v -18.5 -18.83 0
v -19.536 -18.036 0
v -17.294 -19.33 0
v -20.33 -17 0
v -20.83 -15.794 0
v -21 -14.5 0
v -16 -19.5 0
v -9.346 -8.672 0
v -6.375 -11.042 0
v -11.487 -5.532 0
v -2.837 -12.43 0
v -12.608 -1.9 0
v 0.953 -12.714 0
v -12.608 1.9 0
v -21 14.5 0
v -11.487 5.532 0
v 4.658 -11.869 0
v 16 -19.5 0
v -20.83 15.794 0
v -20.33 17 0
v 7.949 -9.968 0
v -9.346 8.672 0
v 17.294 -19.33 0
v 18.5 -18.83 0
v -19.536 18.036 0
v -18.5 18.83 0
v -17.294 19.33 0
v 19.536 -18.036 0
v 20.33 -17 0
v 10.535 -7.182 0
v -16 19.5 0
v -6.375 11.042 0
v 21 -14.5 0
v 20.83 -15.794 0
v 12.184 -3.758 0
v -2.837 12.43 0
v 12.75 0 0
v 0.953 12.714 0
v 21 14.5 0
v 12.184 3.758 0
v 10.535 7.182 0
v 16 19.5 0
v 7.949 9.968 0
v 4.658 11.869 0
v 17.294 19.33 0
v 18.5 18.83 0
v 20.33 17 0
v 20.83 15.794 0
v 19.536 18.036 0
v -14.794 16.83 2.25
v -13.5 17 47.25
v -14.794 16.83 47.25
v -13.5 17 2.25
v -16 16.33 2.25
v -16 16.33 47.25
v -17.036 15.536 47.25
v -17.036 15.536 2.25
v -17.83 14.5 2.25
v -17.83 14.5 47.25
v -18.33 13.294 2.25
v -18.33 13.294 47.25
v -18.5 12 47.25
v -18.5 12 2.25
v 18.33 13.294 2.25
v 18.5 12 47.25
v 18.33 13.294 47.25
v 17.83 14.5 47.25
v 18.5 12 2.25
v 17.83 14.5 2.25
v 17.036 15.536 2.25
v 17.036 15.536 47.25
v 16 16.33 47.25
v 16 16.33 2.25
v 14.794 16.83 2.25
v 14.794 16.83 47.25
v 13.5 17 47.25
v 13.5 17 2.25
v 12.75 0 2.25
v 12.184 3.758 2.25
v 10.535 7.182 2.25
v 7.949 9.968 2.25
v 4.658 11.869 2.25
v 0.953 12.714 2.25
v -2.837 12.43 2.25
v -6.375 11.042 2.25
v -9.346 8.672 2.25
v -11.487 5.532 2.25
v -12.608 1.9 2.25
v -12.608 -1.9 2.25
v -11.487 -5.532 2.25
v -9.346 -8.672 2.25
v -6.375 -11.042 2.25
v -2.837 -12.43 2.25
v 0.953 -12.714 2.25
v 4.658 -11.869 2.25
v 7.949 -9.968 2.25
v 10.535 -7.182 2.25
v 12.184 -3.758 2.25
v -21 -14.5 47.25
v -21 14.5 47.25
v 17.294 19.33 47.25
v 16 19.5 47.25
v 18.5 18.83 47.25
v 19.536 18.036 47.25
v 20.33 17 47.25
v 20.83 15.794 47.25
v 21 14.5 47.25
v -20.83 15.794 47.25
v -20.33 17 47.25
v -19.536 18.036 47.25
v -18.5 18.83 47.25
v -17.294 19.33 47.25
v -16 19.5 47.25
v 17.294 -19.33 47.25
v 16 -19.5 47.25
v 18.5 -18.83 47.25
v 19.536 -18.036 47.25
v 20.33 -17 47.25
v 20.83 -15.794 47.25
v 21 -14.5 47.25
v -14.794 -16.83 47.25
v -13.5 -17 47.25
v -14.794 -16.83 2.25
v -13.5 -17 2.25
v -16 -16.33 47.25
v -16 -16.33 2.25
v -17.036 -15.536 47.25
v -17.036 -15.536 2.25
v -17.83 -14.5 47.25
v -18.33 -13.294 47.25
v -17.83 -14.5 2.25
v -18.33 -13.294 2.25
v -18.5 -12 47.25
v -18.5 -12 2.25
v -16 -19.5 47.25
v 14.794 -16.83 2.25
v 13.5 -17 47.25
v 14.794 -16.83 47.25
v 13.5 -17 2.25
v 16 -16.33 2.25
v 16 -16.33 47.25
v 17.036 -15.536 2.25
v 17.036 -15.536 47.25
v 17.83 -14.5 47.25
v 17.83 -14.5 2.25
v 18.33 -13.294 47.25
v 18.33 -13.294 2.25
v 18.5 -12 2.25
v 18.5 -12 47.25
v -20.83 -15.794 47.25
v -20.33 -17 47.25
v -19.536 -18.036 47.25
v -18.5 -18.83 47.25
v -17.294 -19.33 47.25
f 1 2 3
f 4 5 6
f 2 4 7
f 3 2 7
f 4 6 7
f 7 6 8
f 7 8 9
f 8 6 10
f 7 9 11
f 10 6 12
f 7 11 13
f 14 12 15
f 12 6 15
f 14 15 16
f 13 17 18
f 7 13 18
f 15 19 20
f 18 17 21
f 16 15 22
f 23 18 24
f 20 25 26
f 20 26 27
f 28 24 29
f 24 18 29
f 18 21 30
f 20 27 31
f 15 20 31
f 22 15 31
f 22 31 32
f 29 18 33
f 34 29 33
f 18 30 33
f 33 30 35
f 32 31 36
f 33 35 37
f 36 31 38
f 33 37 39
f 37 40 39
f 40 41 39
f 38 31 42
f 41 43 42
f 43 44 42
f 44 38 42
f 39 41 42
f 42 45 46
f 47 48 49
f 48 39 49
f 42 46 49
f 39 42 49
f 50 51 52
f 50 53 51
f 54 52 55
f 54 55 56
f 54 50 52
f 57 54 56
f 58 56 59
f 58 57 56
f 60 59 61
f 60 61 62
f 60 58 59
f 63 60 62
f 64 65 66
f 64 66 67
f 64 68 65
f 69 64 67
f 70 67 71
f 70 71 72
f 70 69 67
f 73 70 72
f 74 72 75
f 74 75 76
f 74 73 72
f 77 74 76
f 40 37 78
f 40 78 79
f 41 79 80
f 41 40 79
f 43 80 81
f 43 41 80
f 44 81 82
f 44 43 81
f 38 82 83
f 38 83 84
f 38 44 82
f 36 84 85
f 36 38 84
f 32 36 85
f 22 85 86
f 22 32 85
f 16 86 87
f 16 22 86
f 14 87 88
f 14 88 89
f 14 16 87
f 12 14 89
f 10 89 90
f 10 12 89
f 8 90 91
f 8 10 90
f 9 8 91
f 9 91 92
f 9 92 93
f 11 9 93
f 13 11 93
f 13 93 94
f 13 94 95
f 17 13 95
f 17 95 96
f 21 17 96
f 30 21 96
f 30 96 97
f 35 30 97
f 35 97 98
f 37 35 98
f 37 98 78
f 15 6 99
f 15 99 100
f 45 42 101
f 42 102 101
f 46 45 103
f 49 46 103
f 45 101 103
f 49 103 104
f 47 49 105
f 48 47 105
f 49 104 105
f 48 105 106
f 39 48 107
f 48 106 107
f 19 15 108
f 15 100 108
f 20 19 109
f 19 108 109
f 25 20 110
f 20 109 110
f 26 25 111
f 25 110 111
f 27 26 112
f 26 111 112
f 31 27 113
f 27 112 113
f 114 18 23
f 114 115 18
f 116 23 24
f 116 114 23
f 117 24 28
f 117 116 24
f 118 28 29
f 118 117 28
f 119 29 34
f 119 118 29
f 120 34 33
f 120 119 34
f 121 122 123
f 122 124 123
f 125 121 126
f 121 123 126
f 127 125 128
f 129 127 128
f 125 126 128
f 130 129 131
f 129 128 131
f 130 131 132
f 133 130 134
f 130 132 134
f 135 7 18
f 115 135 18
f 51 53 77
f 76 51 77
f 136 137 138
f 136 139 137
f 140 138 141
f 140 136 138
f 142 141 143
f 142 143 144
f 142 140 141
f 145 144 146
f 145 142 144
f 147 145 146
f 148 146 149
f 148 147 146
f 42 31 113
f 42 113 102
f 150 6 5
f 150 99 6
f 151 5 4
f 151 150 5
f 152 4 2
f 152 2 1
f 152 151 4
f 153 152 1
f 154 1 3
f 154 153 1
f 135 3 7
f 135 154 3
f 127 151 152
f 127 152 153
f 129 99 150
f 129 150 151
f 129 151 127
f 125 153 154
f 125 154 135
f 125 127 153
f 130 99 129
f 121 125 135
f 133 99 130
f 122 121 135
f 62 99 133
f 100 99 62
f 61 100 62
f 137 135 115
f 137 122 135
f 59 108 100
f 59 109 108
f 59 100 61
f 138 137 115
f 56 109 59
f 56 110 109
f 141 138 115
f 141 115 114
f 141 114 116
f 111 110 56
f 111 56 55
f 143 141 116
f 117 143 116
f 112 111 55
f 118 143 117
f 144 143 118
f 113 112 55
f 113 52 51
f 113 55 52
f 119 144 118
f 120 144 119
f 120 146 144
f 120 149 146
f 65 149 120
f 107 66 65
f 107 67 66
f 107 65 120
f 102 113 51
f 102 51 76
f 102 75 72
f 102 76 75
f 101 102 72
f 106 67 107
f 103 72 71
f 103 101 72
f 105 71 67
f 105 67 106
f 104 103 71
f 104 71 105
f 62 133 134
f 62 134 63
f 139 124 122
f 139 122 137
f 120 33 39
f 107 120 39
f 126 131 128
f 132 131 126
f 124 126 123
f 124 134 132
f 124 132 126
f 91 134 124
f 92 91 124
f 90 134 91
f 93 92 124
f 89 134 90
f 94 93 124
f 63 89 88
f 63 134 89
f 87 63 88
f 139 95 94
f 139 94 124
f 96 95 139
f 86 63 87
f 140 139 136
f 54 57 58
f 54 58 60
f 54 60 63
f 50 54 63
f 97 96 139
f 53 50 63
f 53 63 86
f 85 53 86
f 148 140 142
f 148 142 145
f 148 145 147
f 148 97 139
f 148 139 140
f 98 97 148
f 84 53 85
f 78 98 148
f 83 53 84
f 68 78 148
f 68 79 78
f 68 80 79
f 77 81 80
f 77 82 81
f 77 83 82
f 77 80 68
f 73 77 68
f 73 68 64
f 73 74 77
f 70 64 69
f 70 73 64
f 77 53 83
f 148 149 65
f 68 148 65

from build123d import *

# Parameters (mm, degrees)
F0_W     = 42
F0_H     = 39
F0_R     = 12.75
F1_DEPTH = 47.25
F2_W     = 37
F2_H     = 34
F2_R     = 12.75
F3_DEPTH = 45
F4_R     = 5


with BuildPart() as f1:
    # F0 (on Top) → F1 (new body)
    with BuildSketch(Plane.XY):
        Rectangle(F0_W, F0_H)
        Circle(F0_R, mode=Mode.SUBTRACT)
    extrude(amount=F1_DEPTH)

    # F2 (on face) → F3 (cut)
    with BuildSketch(Plane.XY.offset(47.25)):
        Rectangle(F2_W, F2_H)
        Circle(F2_R, mode=Mode.SUBTRACT)
    extrude(amount=-F3_DEPTH, mode=Mode.SUBTRACT)

    # F4
    f4_edges = [f1.edges().sort_by_distance(p)[0] for p in [
        (-21, -19.5, 23.625),
        (21, -19.5, 23.625),
        (21, 19.5, 23.625),
        (-21, 19.5, 23.625),
        (-18.5, -17, 24.75),
        (-18.5, 17, 24.75),
        (18.5, 17, 24.75),
        (18.5, -17, 24.75),
    ]]
    fillet(f4_edges, radius=F4_R)


solid = f1.part
